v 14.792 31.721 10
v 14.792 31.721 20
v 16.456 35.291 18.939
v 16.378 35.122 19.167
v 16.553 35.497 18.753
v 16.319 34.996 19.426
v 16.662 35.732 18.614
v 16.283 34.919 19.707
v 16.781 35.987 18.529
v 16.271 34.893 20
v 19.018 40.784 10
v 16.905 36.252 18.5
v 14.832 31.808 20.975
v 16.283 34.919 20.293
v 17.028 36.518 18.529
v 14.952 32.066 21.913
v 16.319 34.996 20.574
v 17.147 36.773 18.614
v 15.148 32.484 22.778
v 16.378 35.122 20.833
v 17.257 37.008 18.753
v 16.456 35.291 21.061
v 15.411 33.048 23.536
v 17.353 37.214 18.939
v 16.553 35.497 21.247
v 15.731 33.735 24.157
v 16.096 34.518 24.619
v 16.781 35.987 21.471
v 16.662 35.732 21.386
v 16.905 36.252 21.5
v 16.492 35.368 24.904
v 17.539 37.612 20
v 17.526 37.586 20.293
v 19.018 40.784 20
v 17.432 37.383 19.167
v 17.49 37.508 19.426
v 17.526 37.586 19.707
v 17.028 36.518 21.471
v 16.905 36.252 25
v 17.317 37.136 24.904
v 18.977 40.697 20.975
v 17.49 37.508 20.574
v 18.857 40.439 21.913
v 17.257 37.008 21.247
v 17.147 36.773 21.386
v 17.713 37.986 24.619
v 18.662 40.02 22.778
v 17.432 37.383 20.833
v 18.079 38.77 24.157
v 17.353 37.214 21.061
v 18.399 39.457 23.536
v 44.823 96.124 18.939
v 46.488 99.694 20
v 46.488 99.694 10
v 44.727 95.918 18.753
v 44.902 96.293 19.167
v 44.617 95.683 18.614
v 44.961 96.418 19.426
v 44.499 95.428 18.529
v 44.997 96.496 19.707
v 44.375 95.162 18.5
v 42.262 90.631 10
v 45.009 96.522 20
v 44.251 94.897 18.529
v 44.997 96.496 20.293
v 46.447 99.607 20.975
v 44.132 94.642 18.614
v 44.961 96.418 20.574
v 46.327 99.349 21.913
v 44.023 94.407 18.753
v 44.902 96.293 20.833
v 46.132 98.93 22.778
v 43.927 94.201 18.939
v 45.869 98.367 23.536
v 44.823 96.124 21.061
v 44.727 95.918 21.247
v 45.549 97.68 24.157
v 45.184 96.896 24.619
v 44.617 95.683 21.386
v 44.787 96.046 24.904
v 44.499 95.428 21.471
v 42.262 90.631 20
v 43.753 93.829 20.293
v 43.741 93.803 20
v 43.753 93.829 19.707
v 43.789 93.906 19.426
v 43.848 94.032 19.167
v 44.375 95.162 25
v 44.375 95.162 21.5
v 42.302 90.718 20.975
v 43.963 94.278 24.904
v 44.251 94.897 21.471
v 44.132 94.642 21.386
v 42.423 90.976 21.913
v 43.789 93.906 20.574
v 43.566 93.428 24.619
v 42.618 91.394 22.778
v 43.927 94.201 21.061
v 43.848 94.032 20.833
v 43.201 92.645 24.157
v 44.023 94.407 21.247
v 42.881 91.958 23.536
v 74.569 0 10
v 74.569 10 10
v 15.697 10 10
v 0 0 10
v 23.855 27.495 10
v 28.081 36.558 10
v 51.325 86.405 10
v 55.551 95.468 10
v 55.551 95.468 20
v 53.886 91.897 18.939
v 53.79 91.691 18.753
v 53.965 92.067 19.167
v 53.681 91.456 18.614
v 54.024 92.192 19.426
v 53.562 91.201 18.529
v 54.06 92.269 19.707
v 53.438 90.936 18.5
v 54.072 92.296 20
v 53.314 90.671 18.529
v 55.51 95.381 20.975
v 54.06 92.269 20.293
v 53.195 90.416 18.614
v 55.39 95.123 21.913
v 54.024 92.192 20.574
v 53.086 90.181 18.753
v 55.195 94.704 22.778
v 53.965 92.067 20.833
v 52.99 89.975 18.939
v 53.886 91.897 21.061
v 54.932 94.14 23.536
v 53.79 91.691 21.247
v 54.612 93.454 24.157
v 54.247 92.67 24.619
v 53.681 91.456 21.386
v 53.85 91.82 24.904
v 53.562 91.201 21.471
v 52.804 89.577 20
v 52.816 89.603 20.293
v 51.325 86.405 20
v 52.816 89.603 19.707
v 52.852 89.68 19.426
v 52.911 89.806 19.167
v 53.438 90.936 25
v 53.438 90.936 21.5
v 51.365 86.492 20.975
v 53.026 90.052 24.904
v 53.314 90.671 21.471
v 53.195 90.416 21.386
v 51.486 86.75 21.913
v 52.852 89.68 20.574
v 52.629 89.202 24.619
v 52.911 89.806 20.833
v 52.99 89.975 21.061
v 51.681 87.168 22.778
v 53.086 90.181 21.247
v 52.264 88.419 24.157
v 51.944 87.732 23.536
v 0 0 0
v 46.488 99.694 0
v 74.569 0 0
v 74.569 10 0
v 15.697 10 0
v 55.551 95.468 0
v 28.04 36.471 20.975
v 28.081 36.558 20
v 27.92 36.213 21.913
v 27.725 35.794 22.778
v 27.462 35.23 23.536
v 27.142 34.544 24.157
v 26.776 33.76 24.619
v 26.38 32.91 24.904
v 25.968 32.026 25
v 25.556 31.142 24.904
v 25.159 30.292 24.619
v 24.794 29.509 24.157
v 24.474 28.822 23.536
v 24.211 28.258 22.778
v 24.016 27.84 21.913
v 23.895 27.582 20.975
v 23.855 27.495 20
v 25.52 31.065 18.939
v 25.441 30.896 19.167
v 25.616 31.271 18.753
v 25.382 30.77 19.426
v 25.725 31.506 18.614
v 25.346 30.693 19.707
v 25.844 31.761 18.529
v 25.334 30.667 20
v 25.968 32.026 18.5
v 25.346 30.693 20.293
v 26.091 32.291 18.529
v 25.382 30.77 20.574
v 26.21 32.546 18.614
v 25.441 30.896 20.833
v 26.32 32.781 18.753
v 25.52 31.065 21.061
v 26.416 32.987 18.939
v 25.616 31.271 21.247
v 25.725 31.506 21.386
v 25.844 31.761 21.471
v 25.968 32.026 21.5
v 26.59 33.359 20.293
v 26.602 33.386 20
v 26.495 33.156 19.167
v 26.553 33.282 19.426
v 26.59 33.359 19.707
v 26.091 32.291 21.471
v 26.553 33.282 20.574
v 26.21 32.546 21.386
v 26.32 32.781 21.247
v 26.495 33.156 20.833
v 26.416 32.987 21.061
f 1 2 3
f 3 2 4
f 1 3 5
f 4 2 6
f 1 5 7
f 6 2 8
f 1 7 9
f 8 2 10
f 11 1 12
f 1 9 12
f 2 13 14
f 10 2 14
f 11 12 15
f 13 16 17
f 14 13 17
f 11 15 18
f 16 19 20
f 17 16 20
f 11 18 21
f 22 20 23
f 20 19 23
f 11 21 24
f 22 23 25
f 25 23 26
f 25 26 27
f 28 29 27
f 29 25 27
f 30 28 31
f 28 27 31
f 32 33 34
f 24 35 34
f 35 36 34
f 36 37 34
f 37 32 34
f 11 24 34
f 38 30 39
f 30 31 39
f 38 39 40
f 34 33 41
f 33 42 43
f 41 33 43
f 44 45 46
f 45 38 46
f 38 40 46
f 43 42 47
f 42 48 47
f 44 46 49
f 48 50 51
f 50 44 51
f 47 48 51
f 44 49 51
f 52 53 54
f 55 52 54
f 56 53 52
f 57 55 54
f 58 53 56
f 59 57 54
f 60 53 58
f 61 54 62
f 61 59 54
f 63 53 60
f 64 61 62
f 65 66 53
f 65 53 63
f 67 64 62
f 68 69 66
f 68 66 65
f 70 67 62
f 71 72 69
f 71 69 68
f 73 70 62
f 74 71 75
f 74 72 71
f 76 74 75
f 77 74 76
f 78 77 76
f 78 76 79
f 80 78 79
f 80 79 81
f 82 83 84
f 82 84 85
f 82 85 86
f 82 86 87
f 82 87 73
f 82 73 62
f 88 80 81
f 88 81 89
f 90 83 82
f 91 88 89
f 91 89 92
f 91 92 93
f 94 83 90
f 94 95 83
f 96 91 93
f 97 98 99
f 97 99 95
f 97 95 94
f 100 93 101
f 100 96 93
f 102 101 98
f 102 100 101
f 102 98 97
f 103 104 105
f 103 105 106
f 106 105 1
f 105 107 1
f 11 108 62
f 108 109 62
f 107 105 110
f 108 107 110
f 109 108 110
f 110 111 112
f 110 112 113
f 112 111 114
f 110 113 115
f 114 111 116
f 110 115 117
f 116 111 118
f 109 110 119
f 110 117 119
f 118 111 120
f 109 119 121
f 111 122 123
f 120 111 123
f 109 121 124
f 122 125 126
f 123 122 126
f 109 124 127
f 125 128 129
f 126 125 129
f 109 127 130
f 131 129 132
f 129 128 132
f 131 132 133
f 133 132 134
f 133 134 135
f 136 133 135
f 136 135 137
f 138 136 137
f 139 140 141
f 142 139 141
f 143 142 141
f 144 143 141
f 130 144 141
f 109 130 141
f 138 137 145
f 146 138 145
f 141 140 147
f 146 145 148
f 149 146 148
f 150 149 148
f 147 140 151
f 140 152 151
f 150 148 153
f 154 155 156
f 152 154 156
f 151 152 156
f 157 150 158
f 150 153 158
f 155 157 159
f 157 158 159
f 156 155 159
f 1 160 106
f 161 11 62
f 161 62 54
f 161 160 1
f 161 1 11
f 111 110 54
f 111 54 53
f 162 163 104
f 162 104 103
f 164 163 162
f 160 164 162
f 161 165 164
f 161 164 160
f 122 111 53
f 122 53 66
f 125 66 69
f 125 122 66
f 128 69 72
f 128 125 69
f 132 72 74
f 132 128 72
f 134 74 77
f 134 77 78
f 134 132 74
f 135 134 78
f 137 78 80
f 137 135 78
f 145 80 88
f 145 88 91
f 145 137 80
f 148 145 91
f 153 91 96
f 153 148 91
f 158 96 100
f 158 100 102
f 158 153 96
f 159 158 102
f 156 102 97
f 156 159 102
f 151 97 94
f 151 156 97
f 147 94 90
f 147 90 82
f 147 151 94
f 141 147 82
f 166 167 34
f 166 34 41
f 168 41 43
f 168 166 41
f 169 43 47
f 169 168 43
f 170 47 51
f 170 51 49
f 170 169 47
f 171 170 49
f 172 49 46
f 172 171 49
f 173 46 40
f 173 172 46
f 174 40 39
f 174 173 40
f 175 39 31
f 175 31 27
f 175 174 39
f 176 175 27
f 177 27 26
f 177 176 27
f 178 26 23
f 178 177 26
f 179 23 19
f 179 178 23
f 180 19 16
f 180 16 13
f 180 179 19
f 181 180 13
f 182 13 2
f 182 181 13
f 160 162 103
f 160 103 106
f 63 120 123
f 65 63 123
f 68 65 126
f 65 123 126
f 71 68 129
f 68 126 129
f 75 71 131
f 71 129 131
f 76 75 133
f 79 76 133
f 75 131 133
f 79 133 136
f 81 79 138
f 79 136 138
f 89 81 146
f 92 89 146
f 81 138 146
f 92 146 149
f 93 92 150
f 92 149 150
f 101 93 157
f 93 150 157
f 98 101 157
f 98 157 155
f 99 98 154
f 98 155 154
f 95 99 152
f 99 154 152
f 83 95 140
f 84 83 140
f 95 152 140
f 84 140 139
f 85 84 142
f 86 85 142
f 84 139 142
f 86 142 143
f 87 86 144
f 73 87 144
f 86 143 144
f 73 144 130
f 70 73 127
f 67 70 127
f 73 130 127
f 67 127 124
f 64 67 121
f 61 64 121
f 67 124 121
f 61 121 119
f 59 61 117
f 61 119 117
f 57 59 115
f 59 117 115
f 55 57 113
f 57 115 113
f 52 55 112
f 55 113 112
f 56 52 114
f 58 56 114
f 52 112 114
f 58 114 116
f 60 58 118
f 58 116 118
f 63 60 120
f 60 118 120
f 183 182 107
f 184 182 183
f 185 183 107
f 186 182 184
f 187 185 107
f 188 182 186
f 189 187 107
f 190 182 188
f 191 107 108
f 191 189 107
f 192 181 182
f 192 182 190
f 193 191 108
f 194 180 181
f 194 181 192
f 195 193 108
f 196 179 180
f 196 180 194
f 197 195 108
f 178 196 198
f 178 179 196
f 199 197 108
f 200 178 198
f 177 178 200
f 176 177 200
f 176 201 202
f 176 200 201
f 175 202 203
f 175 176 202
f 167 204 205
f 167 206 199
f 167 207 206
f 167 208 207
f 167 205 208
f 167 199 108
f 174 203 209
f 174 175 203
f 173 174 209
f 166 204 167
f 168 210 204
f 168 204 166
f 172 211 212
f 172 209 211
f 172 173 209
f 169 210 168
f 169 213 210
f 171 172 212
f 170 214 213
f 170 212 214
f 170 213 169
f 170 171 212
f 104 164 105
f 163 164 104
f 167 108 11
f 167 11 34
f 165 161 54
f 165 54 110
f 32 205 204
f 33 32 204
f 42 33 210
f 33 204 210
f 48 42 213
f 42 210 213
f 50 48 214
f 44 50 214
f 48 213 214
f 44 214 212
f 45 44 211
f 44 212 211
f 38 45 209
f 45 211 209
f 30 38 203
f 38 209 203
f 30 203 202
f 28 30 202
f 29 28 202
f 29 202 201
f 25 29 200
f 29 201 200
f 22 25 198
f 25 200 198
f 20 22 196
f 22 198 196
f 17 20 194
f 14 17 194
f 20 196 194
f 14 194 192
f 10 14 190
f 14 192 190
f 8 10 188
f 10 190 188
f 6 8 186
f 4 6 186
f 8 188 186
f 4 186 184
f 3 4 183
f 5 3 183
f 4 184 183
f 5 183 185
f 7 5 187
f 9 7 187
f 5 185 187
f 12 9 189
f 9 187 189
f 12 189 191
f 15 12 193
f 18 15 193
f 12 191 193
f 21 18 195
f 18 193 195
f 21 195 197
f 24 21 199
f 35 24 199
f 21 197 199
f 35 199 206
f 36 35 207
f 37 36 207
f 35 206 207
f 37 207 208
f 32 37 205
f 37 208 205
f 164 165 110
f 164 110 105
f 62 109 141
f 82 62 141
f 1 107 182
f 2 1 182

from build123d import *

# Parameters (mm, degrees)
PAD_DEPTH    = 10
SKETCH001_R  = 1.5
PAD001_DEPTH = 10


with BuildPart() as part:
    # Sketch → Pad (new body)
    with BuildSketch(Plane.XY):
        Polygon((74.568908, 0), (0, 0), (46.488009, 99.693857), (55.551087, 95.467674), (15.696856, 10), (74.568908, 10), align=None)
    extrude(amount=PAD_DEPTH)

    # Sketch001 (on Face4 of Pad) → Pad001 (join)
    with BuildSketch(Plane(origin=(9.063078, -4.226183, 0), x_dir=(0.422618, 0.906308, 0), z_dir=(0.906308, -0.422618, 0))):
        with BuildLine():
            Line((110, 10), (100, 10))
            Line((100, 10), (100, 20))
            ThreePointArc((110, 20), (105, 25), (100, 20))
            Line((110, 10), (110, 20))
        make_face()
        with Locations((105, 20)):
            Circle(SKETCH001_R, mode=Mode.SUBTRACT)
        with BuildLine():
            Line((45, 10), (45, 20))
            ThreePointArc((45, 20), (40, 25), (35, 20))
            Line((35, 10), (35, 20))
            Line((45, 10), (35, 10))
        make_face()
        with Locations((40, 20)):
            Circle(SKETCH001_R, mode=Mode.SUBTRACT)
    extrude(amount=-PAD001_DEPTH)


solid = part.part
